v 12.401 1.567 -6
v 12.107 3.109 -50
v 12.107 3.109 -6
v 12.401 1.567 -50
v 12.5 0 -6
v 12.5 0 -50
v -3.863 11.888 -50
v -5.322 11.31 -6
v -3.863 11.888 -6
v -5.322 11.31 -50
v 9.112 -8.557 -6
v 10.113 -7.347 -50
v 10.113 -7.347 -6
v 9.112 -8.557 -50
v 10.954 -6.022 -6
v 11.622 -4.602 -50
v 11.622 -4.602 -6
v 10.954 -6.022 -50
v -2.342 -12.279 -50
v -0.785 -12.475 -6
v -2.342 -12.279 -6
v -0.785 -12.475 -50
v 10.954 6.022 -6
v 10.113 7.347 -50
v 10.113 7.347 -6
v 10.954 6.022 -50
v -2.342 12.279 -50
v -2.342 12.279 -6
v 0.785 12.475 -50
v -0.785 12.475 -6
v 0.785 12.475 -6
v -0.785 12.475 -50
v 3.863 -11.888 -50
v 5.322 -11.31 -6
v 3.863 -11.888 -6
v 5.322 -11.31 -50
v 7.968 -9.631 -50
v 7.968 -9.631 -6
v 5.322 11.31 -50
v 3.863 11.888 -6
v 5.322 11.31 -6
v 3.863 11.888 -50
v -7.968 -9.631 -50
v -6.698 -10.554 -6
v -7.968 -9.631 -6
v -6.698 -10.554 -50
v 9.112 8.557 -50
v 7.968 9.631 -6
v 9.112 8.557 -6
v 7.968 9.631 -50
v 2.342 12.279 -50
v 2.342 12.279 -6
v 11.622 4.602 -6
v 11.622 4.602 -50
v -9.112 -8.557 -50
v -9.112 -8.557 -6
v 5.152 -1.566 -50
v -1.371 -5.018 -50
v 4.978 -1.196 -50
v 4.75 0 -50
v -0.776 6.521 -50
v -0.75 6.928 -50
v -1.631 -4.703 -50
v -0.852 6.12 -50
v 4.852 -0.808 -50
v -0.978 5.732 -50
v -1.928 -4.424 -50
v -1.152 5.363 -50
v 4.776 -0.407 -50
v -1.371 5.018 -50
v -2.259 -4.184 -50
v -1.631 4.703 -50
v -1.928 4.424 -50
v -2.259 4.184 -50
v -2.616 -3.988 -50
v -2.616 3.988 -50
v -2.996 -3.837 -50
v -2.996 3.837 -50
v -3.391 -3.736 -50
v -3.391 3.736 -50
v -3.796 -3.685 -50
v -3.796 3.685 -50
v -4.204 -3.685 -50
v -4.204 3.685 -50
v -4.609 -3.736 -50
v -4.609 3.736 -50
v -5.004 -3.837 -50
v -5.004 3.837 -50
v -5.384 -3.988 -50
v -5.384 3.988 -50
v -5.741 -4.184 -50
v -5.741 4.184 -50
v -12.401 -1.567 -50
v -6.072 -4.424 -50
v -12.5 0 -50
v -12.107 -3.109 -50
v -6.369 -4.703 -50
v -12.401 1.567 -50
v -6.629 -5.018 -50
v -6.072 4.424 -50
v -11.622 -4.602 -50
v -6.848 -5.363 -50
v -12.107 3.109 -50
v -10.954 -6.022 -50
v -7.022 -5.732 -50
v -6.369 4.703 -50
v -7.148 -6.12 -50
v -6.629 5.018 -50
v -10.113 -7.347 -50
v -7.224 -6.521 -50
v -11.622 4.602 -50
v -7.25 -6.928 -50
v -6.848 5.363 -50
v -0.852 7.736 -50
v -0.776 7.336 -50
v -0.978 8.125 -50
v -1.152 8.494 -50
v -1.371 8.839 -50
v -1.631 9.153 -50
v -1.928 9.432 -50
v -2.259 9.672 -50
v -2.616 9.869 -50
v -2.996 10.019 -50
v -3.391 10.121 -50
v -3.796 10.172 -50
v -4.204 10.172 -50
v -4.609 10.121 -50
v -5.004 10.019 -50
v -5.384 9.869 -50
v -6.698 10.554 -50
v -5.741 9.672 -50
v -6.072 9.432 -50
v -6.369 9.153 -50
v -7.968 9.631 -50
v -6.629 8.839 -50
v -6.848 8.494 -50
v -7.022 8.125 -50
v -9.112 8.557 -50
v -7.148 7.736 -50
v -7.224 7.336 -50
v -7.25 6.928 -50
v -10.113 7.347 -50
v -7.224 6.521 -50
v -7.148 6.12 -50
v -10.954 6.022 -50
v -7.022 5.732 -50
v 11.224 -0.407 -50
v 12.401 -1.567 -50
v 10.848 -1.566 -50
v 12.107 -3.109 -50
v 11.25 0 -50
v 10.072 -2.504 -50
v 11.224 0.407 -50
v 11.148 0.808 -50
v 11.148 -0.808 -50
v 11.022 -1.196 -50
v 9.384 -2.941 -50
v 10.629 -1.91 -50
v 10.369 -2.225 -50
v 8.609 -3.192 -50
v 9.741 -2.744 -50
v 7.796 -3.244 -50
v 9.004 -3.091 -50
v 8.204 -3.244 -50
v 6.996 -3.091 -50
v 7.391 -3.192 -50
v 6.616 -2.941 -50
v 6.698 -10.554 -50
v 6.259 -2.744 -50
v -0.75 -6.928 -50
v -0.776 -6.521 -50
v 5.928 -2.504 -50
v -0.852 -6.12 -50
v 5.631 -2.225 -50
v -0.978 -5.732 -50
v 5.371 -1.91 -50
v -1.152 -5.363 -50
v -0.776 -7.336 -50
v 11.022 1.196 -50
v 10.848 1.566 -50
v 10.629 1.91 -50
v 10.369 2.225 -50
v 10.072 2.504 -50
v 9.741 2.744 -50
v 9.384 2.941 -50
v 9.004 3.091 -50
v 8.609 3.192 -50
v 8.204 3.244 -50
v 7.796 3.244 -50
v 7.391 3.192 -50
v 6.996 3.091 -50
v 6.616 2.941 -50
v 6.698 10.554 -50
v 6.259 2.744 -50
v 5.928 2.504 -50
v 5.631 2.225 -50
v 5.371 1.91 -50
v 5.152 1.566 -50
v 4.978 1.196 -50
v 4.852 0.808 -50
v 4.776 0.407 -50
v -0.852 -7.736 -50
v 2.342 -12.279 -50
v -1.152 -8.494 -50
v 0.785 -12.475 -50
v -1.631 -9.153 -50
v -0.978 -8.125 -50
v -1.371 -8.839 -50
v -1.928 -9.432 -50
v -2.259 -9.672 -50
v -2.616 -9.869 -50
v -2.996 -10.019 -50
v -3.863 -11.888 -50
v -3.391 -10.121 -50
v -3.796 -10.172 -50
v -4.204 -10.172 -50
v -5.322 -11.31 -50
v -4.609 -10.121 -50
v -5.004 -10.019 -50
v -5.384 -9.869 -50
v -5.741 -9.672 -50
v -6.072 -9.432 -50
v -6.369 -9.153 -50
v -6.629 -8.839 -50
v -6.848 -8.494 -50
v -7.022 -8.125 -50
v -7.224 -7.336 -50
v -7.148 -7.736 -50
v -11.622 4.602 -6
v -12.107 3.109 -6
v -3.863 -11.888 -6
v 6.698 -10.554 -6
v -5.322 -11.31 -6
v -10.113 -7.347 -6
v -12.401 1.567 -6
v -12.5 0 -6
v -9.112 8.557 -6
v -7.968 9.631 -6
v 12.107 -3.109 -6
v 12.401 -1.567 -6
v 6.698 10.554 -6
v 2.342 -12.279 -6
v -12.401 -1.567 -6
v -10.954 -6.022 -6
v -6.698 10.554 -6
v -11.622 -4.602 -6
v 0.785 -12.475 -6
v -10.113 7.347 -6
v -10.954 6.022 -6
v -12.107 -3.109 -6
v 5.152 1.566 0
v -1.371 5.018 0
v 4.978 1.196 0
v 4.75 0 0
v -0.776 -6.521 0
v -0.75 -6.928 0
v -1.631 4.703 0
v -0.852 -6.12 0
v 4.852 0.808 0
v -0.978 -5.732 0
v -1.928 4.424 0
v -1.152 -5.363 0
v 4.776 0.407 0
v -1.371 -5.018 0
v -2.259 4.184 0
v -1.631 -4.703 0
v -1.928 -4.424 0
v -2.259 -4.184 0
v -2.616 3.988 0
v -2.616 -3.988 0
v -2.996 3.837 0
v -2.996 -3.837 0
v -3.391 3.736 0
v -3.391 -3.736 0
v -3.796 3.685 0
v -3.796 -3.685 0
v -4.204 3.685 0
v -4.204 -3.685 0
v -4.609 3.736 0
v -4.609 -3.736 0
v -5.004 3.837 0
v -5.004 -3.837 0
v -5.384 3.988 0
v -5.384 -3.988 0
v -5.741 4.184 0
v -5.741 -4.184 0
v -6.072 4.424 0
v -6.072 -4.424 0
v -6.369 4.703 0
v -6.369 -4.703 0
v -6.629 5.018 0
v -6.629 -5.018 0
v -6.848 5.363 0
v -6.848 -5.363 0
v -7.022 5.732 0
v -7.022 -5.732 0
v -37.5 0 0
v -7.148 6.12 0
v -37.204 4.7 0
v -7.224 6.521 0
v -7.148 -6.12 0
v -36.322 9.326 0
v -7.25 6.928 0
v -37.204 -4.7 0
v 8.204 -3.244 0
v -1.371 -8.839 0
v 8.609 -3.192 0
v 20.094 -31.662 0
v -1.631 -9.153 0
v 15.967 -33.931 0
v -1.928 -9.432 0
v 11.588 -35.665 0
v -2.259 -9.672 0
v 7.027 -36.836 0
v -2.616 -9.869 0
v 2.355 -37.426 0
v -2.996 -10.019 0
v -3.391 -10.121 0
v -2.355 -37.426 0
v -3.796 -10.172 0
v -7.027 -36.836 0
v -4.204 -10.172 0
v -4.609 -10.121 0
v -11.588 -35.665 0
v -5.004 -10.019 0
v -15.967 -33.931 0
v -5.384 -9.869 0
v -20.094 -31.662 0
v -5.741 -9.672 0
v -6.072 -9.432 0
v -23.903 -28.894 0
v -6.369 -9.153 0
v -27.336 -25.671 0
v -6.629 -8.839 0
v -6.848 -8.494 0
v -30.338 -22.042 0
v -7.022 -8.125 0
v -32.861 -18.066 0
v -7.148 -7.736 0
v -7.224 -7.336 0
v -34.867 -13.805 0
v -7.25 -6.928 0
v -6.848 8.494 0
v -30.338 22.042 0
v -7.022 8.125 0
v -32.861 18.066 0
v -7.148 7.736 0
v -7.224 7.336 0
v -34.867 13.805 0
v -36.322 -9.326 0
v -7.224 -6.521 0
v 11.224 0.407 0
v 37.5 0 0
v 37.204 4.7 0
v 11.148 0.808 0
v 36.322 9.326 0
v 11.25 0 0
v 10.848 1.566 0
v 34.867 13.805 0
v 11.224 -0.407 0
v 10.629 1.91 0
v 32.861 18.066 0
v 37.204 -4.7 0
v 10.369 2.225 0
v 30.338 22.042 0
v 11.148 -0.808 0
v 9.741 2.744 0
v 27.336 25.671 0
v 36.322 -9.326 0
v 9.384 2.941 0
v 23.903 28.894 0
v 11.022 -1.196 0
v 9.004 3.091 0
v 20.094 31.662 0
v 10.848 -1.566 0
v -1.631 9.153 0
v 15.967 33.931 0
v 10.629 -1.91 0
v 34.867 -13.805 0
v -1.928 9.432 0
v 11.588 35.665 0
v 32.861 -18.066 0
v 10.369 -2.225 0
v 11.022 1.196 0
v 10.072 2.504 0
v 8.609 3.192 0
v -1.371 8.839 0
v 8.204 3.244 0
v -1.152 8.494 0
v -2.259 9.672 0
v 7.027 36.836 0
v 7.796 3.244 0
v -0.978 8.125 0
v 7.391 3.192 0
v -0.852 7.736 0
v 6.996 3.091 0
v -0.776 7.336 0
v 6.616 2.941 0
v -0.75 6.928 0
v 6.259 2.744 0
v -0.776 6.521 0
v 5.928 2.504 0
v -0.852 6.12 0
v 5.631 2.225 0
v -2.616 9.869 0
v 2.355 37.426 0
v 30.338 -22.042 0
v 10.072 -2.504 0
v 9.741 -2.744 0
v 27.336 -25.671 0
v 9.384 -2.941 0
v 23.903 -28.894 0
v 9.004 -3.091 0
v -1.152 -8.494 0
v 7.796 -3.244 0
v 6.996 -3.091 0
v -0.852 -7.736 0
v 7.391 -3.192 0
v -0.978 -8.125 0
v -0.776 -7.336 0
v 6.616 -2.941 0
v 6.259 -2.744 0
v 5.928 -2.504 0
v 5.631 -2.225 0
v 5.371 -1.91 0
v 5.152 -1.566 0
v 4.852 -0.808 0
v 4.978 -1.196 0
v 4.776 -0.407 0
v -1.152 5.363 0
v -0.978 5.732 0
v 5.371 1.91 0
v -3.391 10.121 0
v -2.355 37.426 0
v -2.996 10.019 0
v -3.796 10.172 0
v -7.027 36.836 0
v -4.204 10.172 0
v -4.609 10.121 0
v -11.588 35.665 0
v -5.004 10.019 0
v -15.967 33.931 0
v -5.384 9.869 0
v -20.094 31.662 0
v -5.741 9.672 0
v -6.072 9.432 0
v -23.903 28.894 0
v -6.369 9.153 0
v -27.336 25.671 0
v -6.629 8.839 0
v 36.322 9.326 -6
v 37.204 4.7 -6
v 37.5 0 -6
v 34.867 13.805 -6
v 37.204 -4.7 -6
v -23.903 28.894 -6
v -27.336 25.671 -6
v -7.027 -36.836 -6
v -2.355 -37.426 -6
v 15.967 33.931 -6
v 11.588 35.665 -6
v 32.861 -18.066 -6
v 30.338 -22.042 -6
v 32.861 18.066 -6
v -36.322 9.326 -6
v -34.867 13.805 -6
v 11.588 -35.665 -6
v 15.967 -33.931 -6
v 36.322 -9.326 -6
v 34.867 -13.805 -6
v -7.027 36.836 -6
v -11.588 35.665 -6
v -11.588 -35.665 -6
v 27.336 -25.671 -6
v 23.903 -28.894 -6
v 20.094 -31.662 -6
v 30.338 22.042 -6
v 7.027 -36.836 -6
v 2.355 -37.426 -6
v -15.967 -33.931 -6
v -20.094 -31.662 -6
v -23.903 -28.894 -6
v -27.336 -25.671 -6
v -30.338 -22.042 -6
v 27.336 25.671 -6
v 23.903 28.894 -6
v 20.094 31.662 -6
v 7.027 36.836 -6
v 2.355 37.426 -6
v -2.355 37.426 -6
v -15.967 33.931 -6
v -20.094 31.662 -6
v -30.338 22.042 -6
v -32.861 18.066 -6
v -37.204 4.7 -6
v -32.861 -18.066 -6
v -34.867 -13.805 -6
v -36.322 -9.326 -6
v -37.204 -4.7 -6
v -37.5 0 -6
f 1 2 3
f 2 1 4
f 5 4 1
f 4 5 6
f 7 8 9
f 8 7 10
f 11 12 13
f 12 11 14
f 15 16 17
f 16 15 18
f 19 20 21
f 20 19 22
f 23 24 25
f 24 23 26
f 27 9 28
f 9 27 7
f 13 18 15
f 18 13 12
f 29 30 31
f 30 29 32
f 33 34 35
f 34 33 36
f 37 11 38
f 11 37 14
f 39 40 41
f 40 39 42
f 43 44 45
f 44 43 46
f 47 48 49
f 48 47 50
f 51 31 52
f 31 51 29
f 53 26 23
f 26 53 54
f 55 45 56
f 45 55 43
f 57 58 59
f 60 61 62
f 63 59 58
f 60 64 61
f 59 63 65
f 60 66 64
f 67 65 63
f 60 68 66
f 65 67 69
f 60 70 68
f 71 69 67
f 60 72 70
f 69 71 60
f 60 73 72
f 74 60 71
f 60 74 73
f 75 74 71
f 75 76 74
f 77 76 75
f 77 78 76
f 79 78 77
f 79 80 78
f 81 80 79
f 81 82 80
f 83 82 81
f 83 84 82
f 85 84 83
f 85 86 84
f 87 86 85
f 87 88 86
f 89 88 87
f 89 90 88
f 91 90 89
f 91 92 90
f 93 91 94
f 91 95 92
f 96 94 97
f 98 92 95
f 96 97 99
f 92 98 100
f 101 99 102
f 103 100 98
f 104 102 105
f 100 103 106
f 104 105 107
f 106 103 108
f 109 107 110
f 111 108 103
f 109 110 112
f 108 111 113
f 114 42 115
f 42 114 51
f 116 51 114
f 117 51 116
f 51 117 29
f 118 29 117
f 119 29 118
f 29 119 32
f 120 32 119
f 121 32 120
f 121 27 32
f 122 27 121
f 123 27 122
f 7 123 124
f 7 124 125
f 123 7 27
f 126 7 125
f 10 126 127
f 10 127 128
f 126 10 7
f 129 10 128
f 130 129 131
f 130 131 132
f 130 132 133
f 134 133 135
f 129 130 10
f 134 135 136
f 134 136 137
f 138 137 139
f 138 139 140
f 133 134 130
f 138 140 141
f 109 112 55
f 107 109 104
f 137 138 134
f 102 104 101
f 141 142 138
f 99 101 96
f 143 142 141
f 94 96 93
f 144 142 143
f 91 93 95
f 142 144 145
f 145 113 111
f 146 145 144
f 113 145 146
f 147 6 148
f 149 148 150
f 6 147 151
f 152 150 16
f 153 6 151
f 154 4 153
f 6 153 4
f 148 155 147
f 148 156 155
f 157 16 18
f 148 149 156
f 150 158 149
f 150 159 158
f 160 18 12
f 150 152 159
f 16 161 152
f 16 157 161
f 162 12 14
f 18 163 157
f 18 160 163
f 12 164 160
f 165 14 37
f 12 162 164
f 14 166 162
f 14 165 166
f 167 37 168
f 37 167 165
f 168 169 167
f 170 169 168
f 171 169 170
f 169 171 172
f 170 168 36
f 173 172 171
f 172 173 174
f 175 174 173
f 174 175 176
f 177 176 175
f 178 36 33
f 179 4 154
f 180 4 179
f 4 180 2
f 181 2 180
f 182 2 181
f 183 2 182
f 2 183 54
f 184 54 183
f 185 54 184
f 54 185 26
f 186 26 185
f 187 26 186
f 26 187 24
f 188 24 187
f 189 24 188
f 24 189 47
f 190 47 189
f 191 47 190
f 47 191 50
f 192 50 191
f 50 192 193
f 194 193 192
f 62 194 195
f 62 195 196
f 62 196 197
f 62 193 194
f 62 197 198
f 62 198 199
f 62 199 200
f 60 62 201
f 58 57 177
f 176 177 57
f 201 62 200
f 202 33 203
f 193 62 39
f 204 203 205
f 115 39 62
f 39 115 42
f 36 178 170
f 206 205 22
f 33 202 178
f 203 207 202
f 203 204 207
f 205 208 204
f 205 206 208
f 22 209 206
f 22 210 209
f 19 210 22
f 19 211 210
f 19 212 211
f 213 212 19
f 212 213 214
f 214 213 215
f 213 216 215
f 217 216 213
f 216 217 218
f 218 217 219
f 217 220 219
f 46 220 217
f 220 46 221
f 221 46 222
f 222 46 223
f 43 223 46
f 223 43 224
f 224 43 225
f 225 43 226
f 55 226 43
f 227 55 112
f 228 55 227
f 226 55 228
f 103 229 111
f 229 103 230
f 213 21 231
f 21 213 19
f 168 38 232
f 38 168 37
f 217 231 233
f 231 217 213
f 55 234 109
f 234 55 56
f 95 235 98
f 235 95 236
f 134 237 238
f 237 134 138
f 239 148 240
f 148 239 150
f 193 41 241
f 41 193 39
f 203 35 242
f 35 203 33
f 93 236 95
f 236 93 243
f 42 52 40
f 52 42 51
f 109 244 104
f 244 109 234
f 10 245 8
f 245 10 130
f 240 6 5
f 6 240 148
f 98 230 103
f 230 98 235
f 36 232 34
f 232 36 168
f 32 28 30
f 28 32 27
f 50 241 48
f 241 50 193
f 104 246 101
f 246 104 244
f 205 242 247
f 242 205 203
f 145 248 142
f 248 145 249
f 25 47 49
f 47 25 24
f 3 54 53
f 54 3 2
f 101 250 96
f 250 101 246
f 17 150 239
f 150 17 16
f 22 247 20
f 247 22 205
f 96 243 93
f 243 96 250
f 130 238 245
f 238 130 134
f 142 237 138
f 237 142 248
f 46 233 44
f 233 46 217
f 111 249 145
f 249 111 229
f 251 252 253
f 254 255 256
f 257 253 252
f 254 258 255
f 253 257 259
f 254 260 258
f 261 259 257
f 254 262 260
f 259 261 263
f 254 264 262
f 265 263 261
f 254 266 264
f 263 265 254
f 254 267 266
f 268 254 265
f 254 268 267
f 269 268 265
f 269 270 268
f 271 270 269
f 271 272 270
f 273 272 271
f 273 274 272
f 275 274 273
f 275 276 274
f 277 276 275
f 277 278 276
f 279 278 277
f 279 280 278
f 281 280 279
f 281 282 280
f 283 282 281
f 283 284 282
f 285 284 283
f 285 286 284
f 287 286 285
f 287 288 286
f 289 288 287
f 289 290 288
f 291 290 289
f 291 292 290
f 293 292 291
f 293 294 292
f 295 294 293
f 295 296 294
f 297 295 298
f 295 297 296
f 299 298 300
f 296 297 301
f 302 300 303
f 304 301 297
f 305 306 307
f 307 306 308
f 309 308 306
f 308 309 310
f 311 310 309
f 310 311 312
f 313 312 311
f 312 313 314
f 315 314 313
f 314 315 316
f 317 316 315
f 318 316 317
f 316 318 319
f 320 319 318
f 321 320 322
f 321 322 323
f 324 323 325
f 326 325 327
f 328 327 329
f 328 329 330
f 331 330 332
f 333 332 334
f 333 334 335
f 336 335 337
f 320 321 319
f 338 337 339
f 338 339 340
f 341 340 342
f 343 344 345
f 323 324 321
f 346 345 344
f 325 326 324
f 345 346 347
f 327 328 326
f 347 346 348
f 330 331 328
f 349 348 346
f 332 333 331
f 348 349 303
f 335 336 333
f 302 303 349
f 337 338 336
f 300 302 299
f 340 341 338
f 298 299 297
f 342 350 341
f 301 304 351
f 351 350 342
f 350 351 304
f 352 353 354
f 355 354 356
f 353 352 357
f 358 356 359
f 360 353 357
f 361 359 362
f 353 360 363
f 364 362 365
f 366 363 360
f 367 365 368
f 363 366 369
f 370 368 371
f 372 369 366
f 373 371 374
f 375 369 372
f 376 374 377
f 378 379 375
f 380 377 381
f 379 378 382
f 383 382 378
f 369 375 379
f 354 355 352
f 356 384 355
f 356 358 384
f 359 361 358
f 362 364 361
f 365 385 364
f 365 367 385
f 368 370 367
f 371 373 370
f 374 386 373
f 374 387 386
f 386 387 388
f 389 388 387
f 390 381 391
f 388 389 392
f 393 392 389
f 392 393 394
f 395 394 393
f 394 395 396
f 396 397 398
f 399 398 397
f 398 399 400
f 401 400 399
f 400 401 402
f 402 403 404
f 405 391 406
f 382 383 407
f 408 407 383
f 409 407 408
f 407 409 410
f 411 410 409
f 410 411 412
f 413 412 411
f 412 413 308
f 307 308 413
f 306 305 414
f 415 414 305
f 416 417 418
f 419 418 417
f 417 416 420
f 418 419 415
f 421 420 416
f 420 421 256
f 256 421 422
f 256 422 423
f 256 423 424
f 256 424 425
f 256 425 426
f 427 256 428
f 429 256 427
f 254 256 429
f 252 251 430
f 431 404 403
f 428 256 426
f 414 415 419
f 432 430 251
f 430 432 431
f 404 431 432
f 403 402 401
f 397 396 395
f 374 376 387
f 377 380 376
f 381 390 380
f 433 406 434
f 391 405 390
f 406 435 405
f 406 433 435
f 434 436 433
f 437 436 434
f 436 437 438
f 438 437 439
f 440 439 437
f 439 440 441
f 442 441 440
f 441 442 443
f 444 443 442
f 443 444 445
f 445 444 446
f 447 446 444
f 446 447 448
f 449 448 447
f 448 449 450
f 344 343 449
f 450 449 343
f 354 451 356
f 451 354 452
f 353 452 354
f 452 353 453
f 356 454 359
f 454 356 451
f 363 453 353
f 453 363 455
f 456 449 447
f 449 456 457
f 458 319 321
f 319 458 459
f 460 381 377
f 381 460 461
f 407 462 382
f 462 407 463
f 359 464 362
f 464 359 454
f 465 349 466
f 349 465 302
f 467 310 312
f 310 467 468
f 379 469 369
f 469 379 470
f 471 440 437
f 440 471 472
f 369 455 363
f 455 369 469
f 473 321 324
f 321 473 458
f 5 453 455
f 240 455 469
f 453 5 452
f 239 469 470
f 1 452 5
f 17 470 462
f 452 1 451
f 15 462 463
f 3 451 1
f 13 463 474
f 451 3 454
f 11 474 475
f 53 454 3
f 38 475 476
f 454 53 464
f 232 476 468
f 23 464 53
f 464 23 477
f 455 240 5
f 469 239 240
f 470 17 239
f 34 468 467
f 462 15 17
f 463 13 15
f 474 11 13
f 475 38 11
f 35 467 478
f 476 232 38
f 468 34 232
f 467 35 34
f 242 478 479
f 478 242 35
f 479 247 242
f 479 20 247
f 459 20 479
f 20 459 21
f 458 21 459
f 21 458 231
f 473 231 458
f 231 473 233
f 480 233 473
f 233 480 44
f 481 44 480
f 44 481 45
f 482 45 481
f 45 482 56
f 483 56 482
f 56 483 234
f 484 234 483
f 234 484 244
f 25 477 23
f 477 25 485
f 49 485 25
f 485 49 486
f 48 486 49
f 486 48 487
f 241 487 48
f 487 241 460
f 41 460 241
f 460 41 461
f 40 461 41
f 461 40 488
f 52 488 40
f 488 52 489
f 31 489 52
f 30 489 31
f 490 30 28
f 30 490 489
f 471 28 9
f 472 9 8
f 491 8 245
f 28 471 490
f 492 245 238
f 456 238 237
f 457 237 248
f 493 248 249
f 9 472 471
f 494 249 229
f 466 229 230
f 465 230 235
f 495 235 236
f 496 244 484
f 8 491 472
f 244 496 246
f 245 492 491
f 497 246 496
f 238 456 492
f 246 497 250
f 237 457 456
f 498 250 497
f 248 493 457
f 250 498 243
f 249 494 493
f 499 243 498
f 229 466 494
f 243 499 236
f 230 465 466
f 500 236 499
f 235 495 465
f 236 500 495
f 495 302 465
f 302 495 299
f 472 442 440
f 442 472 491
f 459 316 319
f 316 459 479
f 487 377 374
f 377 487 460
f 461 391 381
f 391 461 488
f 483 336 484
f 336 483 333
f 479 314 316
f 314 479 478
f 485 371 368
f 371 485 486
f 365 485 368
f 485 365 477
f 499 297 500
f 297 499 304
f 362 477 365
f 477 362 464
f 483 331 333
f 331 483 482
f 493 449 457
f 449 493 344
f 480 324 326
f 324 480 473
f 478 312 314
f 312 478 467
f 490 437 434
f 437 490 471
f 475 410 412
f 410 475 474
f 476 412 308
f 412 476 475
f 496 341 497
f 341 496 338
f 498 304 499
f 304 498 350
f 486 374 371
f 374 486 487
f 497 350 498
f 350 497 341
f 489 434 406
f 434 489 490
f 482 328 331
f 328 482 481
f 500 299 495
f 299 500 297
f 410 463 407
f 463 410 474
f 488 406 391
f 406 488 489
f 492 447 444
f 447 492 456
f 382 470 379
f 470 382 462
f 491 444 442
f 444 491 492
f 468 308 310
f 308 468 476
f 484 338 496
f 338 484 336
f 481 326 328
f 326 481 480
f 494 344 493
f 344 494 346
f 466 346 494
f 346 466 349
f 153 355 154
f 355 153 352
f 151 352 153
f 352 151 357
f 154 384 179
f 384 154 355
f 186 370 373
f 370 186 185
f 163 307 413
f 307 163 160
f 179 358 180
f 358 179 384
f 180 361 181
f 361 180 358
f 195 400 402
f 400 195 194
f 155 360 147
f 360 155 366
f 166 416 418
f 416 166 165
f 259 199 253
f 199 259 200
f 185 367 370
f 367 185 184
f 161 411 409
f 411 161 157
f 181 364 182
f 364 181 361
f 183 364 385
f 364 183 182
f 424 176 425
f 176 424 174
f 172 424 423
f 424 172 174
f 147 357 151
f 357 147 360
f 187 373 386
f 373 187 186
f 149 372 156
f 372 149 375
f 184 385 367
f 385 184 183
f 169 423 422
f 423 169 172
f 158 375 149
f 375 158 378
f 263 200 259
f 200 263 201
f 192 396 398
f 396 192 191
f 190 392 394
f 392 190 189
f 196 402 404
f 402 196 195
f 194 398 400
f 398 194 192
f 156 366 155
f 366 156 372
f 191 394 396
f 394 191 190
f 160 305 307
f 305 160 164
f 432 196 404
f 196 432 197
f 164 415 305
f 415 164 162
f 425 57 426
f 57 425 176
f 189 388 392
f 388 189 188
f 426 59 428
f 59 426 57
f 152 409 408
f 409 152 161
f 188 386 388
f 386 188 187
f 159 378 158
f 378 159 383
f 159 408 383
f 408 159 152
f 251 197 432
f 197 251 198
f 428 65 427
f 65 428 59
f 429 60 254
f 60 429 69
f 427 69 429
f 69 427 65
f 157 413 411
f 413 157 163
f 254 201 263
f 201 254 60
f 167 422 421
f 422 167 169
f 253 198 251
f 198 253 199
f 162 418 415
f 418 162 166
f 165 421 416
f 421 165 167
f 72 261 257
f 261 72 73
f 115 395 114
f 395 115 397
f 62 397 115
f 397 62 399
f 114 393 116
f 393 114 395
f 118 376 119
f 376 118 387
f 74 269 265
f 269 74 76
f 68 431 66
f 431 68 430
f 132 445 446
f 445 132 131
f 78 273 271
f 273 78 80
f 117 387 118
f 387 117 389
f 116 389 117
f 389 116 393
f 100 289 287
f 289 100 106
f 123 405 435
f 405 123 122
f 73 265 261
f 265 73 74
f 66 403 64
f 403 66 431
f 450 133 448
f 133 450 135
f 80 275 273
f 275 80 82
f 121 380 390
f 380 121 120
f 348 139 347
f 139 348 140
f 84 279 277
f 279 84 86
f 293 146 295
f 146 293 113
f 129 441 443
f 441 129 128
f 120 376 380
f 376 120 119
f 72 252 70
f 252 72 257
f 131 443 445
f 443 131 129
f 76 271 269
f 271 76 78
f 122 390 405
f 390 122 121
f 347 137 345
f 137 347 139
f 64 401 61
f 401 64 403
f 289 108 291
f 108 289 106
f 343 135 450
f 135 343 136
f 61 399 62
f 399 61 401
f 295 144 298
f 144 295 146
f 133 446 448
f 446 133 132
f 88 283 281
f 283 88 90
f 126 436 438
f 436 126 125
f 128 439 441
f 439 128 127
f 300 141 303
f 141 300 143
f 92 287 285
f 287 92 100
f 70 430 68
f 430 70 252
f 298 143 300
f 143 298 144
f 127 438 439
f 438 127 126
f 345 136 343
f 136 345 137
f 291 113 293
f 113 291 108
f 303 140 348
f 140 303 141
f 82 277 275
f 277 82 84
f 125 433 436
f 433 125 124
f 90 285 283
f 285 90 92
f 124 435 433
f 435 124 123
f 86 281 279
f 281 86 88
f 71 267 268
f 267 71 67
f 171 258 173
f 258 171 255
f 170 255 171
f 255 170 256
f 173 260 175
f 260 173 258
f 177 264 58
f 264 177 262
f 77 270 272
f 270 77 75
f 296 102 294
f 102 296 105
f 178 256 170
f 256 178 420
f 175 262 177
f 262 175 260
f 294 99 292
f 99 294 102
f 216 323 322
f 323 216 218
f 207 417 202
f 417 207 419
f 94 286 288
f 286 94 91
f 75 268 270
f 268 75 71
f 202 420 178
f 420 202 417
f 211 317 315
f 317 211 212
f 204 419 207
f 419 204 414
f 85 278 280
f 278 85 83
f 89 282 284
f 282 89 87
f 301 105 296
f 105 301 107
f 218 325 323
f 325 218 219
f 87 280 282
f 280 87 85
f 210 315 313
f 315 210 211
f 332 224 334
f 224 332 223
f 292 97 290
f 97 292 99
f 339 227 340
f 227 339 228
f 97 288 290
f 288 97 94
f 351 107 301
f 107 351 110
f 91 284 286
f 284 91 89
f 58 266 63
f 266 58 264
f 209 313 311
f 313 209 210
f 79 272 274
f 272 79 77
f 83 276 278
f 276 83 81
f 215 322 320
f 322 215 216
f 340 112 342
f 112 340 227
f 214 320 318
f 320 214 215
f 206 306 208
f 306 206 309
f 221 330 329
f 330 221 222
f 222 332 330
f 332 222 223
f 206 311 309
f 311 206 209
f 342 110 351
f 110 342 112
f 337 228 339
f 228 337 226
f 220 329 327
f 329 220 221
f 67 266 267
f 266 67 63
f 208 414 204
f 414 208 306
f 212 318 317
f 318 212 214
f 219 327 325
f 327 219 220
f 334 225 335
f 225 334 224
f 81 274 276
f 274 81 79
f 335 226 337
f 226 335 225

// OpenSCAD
$fn = 50;


difference() {
	union() {
		translate(v = [0, 0, -50.0000000000]) {
			cylinder(h = 50, r = 12.5000000000);
		}
		translate(v = [0, 0, -6.0000000000]) {
			cylinder(h = 6, r = 37.5000000000);
		}
	}
	union() {
		#translate(v = [8.0000000000, 0.0000000000, -50]) {
			cylinder(h = 50, r = 3.2500000000);
		}
		#translate(v = [-4.0000000000, 6.9282032303, -50]) {
			cylinder(h = 50, r = 3.2500000000);
		}
		#translate(v = [-4.0000000000, -6.9282032303, -50]) {
			cylinder(h = 50, r = 3.2500000000);
		}
	}
}
